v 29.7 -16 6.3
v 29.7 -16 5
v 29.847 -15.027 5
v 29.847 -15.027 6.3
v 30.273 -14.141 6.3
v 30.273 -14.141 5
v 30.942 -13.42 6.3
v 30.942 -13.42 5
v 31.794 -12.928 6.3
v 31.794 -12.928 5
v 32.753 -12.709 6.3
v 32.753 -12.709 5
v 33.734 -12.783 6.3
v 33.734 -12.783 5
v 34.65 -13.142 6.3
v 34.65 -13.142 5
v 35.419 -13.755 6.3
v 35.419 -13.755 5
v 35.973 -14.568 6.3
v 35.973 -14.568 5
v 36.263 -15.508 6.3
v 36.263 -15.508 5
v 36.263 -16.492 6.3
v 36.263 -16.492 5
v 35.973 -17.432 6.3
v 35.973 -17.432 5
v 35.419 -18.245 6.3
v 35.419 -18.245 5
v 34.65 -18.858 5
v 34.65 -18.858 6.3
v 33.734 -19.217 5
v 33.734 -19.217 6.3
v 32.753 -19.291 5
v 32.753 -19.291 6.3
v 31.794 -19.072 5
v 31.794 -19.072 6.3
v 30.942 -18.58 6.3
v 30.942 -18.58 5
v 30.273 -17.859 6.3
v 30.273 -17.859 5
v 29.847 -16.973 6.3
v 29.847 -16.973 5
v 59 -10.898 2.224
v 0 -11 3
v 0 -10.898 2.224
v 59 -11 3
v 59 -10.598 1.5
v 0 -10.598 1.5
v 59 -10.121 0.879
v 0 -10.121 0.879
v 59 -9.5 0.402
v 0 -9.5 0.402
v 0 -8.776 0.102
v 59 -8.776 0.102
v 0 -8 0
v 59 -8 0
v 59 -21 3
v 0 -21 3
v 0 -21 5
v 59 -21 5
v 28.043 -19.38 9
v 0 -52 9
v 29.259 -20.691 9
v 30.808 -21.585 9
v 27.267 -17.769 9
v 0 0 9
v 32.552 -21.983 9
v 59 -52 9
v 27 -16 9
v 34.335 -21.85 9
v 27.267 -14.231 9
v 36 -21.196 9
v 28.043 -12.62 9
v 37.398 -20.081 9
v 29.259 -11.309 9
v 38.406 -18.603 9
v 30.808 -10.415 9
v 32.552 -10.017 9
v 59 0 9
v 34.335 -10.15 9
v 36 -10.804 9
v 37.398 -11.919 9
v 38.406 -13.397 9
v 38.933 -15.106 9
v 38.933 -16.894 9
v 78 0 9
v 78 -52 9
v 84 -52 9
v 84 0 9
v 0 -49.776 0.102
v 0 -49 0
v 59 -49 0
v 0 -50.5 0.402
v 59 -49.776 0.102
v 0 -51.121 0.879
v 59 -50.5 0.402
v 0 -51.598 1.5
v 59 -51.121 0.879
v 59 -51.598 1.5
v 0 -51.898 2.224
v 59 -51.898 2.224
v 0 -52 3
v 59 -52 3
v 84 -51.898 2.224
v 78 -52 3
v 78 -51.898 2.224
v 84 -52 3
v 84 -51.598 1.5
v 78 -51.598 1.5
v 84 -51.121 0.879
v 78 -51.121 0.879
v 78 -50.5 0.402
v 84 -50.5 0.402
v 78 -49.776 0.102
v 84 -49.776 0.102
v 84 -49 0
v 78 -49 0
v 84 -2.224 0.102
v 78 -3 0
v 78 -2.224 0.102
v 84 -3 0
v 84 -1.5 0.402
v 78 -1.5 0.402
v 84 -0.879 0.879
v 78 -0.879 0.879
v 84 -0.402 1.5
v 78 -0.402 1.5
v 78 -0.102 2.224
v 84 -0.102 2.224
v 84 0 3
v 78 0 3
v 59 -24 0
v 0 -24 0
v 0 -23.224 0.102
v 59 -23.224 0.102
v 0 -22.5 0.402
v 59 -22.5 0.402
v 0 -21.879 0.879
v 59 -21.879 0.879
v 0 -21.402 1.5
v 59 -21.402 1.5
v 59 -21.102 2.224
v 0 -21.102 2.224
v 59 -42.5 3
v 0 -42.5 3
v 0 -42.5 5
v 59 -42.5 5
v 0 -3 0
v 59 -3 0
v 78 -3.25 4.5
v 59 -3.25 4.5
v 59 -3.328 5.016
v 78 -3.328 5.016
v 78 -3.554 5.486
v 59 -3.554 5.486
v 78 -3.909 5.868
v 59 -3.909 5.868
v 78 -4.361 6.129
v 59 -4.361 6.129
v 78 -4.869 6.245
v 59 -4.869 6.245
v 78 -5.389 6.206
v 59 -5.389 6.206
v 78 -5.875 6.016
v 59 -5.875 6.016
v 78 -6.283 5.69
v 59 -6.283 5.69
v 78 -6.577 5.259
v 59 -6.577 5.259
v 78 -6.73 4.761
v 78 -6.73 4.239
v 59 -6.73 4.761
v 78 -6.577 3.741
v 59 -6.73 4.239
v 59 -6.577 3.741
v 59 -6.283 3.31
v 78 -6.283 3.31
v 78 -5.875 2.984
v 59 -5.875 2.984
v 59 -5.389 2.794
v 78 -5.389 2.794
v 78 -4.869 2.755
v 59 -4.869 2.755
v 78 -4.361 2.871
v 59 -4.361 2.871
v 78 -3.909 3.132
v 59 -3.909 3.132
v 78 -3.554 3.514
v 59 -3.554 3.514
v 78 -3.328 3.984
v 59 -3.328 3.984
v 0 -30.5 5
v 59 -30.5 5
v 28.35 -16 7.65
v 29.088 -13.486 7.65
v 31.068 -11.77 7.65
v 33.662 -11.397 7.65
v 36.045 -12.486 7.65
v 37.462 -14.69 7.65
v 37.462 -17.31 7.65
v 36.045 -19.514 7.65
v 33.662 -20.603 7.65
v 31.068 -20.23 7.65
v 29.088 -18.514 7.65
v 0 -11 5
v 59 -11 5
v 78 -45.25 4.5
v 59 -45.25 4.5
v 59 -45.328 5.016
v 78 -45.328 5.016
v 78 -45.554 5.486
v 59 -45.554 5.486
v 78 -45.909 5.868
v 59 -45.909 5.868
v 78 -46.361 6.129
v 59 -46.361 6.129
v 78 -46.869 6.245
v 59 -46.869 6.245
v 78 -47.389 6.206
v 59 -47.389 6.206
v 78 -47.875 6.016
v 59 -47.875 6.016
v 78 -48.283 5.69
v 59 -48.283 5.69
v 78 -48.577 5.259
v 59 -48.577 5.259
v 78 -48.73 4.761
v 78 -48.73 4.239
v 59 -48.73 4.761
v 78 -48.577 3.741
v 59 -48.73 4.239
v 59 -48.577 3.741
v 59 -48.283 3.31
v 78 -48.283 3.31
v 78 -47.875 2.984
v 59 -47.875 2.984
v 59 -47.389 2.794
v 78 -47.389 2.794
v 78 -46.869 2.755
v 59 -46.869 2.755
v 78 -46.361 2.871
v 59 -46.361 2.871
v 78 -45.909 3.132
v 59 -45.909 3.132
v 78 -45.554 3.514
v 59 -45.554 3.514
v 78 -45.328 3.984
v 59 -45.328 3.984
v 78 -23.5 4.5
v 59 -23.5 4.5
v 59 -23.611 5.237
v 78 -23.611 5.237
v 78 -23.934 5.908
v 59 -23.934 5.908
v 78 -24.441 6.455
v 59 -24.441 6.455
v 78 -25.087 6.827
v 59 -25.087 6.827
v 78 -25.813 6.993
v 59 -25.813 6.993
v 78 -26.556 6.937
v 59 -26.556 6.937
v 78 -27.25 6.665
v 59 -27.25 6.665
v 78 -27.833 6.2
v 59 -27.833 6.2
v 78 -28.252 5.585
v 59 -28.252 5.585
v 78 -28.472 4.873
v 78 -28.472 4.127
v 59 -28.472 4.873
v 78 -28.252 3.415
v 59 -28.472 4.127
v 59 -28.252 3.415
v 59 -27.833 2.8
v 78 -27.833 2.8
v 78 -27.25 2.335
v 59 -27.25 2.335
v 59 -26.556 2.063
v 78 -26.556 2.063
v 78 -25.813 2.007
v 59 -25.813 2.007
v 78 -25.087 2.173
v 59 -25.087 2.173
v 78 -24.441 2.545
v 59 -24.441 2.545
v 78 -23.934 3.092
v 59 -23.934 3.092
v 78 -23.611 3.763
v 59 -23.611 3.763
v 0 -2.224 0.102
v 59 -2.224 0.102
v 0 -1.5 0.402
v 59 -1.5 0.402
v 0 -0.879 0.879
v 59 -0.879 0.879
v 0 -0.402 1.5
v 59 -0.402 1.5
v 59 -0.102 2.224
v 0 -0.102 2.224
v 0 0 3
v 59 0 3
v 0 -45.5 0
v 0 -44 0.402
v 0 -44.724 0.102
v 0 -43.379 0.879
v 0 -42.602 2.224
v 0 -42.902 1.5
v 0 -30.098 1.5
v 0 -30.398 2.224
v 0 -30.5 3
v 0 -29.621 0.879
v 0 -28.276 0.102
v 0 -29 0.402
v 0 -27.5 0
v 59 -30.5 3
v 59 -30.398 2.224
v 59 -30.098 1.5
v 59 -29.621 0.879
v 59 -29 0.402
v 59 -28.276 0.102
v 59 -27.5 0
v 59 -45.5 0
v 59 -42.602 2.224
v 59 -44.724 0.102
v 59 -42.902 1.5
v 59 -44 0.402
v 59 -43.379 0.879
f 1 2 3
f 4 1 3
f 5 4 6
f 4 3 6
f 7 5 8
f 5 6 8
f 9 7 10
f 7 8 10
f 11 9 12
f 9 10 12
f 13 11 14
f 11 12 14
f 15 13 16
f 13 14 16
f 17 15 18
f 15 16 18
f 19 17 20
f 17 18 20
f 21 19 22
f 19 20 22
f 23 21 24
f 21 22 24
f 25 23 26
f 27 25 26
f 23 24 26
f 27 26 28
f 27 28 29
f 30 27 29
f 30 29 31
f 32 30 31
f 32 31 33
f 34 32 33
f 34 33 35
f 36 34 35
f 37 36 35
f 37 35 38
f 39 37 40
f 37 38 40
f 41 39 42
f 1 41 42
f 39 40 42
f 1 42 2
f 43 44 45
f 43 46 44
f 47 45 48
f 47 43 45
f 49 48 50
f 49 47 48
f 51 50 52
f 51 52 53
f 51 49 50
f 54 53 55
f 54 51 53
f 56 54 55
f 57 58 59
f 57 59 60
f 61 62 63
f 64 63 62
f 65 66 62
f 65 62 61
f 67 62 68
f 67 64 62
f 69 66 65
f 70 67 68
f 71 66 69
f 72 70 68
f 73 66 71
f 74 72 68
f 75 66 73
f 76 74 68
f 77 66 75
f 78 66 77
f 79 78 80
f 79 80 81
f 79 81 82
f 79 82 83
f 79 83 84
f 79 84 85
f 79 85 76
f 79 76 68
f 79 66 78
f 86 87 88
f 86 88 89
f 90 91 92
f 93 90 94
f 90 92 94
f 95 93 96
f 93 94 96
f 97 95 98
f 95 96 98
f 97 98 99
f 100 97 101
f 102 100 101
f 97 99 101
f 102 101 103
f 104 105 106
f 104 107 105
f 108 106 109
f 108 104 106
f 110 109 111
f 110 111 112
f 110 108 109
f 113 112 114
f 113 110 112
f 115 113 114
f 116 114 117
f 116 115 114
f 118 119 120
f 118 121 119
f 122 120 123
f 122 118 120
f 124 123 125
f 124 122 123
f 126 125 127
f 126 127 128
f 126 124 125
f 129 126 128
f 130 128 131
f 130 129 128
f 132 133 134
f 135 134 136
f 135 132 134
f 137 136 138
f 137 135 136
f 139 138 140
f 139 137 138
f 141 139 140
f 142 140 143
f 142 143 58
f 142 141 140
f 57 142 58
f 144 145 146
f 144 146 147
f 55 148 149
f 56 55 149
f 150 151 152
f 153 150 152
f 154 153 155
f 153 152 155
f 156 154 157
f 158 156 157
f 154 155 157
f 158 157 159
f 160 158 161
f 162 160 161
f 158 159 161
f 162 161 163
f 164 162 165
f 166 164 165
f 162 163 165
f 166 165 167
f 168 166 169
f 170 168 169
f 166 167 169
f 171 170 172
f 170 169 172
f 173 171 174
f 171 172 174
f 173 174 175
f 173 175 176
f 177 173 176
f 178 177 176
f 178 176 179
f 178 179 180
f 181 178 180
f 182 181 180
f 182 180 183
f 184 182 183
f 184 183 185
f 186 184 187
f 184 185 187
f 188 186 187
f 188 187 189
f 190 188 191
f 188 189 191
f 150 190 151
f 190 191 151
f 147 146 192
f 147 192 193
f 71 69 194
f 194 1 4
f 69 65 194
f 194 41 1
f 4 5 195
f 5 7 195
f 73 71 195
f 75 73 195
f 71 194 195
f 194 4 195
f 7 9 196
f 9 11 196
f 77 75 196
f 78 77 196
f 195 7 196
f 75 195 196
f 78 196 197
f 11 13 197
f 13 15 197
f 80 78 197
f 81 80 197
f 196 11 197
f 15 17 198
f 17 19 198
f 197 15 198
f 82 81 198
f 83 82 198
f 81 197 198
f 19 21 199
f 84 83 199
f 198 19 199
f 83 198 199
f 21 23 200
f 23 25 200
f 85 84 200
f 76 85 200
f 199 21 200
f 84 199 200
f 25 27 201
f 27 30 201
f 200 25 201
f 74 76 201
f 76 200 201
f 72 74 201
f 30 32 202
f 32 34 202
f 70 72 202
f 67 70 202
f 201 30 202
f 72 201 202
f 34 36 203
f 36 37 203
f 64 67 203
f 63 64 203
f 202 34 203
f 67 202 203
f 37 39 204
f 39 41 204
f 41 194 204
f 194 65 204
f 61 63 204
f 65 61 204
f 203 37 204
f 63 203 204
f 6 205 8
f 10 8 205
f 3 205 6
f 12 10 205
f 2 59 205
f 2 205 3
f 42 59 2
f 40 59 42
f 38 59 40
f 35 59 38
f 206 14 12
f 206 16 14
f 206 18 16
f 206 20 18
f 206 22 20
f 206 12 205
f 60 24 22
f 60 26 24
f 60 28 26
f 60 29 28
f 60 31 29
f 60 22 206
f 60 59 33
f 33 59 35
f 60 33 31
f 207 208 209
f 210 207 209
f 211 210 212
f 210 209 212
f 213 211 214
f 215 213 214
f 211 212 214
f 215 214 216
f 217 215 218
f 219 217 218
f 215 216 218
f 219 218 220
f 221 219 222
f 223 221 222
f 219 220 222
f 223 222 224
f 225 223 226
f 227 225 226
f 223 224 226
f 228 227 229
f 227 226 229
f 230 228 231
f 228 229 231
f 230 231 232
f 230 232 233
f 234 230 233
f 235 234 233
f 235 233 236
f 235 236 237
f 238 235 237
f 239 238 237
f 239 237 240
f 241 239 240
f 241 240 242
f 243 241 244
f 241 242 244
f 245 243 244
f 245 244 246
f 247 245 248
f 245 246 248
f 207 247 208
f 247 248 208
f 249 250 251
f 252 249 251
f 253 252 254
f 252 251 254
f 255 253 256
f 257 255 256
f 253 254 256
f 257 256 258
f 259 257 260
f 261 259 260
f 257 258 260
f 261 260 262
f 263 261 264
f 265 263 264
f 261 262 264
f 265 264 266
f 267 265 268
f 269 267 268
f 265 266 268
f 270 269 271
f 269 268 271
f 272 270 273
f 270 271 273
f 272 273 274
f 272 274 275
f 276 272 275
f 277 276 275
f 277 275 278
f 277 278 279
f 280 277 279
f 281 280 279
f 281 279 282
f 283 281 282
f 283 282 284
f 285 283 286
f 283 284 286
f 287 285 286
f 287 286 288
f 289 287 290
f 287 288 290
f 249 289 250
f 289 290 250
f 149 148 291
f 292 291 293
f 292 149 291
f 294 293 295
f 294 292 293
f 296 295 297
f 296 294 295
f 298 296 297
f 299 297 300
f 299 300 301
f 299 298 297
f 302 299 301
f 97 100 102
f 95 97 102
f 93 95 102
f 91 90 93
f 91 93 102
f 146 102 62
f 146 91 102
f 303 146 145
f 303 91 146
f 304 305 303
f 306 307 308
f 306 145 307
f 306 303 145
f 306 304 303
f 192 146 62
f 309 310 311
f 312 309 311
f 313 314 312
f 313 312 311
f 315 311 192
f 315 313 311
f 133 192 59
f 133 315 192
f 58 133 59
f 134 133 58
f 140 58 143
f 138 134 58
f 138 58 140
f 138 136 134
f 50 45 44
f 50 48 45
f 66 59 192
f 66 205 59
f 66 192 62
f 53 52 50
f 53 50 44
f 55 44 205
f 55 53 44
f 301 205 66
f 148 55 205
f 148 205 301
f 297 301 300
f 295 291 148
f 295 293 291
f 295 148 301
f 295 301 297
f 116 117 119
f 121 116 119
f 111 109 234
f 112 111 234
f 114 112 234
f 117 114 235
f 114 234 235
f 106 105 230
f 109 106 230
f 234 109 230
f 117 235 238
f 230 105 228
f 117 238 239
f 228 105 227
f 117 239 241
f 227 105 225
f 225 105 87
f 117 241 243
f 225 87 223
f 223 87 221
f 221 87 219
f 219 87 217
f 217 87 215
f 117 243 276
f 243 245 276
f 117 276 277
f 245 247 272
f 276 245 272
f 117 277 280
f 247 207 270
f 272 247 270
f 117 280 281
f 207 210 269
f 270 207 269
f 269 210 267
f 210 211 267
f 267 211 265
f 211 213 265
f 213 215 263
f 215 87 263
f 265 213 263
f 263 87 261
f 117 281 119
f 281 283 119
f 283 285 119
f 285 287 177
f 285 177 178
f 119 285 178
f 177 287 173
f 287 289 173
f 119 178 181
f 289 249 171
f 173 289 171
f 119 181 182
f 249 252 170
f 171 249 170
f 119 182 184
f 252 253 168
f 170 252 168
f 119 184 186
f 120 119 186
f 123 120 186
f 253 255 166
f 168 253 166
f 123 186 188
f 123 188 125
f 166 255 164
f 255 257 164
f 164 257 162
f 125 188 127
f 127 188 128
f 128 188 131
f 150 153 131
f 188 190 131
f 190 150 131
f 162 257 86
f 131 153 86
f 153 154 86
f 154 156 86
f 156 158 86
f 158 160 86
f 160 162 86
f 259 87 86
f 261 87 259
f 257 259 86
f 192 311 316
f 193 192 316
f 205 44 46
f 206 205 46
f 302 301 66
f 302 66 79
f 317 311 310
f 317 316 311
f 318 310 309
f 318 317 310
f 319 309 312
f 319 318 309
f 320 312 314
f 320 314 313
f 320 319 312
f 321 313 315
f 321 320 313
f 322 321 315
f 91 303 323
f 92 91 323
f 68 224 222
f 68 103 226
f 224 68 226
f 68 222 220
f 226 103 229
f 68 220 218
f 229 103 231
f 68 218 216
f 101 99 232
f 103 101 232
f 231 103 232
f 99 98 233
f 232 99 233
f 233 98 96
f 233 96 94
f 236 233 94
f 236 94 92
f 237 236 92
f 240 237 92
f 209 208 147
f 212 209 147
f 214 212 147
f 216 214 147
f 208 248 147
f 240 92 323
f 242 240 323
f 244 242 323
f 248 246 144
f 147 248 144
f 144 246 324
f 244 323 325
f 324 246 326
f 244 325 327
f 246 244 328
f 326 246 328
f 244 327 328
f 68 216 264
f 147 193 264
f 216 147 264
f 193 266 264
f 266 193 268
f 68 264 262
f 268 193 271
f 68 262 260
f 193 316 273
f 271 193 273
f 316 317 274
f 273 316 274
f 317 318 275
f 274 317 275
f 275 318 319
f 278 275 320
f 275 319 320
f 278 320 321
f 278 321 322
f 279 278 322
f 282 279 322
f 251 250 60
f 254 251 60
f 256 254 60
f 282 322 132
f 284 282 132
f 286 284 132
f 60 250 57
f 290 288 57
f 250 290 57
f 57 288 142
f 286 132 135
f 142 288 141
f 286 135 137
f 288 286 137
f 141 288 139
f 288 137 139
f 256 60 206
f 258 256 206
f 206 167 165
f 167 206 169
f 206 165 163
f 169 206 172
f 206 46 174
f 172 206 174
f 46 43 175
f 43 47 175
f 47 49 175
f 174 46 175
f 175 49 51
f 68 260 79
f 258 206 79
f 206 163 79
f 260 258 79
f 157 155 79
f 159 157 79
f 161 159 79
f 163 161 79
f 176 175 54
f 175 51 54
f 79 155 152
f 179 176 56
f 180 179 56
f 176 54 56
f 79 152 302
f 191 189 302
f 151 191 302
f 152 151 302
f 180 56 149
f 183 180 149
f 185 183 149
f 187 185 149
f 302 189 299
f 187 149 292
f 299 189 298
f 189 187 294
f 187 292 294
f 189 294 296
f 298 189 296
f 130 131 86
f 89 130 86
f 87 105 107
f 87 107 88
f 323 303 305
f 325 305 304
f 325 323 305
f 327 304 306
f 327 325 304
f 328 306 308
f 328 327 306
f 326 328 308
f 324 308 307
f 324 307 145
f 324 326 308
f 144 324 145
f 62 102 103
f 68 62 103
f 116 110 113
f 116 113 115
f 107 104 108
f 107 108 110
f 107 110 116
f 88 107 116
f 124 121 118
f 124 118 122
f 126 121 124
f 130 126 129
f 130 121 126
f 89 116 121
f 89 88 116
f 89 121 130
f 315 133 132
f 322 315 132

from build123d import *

# Parameters (mm, degrees)
SKETCH_W         = 59
SKETCH_H         = 52
PAD_DEPTH        = 9
SKETCH001_R      = 1.75
SKETCH001_R_2    = 2.5
PAD001_DEPTH     = 19
SKETCH002_W      = 52
SKETCH002_H      = 9
PAD002_DEPTH     = 6
HOLE_D           = 6.6
HOLE_DEPTH       = 25
HOLE_CSINK_D     = 12
HOLE_CSINK_ANGLE = 90
SKETCH004_W      = 59
SKETCH004_H      = 10
SKETCH004_H_2    = 12
POCKET_DEPTH     = 5
FILLET_R         = 3


with BuildPart() as part:
    # Sketch → Pad (new body)
    with BuildSketch(Plane.XY):
        with Locations((29.5, -26)):
            Rectangle(SKETCH_W, SKETCH_H)
    extrude(amount=PAD_DEPTH)

    # Sketch001 (on Face2 of Pad) → Pad001 (join)
    with BuildSketch(Plane.YZ.offset(59)):
        with Locations((-47, 4.5)):
            Circle(SKETCH001_R)
        with Locations((-5, 4.5)):
            Circle(SKETCH001_R)
        with Locations((-26, 4.5)):
            Circle(SKETCH001_R_2)
    extrude(amount=PAD001_DEPTH)

    # Sketch002 (on Face12 of Pad001) → Pad002 (join)
    with BuildSketch(Plane.YZ.offset(78)):
        with Locations((-26, 4.5)):
            Rectangle(SKETCH002_W, SKETCH002_H)
    extrude(amount=PAD002_DEPTH)

    # Hole
    with Locations(Plane.XY.offset(9)):
        with Locations((33, -16)):
            CounterSinkHole(HOLE_D / 2, HOLE_CSINK_D / 2, depth=HOLE_DEPTH, counter_sink_angle=HOLE_CSINK_ANGLE)

    # Sketch004 (on Face12 of Hole) → Pocket (cut)
    with BuildSketch(Plane(origin=(0, 0, 0), x_dir=(1, 0, 0), z_dir=(0, 0, -1))):
        with Locations((29.5, 16)):
            Rectangle(SKETCH004_W, SKETCH004_H)
        with Locations((29.5, 36.5)):
            Rectangle(SKETCH004_W, SKETCH004_H_2)
    extrude(amount=-POCKET_DEPTH, mode=Mode.SUBTRACT)

    # Fillet
    fillet_edges = [part.edges().sort_by_distance(p)[0] for p in [
        (29.5, 0, 0),
        (81, 0, 0),
        (29.5, -11, 0),
        (29.5, -21, 0),
        (29.5, -30.5, 0),
        (29.5, -42.5, 0),
        (29.5, -52, 0),
        (81, -52, 0),
    ]]
    fillet(fillet_edges, radius=FILLET_R)


solid = part.part
